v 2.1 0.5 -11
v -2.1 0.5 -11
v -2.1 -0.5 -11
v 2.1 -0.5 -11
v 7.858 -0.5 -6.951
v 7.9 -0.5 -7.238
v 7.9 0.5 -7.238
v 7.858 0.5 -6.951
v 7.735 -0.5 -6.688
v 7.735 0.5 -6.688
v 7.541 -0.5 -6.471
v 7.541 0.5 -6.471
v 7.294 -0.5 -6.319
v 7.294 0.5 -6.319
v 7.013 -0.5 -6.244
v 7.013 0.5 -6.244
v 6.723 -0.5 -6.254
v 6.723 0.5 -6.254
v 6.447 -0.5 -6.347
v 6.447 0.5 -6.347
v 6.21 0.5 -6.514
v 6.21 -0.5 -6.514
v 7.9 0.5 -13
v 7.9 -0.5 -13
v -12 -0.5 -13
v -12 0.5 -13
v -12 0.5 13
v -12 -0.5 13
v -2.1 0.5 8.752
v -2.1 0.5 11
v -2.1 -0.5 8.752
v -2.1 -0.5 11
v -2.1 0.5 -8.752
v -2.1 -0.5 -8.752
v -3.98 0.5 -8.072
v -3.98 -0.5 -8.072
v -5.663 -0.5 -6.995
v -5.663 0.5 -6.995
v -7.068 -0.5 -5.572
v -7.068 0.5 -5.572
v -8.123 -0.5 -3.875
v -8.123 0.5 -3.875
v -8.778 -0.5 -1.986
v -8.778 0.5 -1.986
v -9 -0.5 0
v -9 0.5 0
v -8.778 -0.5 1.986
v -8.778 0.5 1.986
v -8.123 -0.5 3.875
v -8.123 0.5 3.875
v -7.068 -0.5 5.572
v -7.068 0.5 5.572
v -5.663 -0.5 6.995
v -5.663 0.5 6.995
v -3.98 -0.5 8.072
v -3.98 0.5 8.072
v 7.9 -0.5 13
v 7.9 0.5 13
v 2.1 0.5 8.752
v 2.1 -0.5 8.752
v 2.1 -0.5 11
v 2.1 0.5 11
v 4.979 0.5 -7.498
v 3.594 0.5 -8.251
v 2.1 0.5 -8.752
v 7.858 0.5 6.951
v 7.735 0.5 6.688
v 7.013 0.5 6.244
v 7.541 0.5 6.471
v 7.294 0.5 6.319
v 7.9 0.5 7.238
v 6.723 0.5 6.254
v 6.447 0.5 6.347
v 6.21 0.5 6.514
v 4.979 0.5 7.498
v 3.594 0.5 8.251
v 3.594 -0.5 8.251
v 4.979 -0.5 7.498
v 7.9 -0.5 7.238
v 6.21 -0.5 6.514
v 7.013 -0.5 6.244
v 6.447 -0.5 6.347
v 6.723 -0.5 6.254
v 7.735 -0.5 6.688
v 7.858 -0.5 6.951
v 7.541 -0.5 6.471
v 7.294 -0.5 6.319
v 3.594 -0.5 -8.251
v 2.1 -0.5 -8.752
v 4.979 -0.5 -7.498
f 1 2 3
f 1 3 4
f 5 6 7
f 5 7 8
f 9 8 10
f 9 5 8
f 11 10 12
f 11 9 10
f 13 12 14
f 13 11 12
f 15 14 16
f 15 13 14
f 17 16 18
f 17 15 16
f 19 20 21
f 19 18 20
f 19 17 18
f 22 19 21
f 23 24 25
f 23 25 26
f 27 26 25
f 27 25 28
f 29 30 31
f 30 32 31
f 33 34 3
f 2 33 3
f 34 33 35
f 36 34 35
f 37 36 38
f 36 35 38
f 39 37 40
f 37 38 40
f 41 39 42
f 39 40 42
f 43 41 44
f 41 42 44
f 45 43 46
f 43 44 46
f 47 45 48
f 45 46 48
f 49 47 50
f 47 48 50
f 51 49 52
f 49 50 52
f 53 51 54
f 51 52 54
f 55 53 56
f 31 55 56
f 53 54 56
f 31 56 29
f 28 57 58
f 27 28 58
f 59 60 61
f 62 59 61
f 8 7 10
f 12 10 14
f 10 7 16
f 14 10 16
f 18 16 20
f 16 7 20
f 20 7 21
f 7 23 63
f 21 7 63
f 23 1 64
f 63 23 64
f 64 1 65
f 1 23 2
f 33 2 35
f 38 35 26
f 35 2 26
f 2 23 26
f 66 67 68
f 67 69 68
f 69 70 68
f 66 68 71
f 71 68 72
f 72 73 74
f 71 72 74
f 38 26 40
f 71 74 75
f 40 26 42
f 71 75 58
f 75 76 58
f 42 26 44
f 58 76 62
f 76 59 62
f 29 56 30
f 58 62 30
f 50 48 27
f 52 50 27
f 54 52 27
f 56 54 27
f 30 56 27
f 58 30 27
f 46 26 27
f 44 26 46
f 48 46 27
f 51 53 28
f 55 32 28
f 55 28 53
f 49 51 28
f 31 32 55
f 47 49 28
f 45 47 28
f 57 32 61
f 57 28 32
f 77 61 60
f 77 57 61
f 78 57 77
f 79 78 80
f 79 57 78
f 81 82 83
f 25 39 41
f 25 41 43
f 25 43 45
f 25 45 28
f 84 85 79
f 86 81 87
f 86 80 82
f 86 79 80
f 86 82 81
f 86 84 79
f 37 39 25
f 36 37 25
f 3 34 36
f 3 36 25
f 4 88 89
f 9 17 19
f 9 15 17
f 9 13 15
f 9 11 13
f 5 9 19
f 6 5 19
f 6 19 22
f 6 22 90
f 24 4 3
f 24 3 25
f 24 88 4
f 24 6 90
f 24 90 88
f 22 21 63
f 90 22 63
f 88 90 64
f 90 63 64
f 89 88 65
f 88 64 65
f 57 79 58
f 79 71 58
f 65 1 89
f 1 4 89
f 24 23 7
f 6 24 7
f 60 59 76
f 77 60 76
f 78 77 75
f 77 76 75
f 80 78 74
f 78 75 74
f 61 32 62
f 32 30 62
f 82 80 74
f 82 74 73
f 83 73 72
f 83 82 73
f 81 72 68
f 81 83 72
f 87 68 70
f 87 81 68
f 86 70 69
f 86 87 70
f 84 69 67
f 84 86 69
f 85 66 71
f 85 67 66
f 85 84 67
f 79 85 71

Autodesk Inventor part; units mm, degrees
ref_plane "YZ Plane" through (0, 0, 0) normal (1, 0, 0) x (0, 1, 0)
ref_plane "XZ Plane" through (0, 0, 0) normal (0, 1, 0) x (-1, 0, 0)
ref_plane "XY Plane" through (0, 0, 0) normal (0, 0, 1) x (1, 0, 0)
sketch "Esquisse1" plane through (0, 0, 0) normal (1, 0, 0) x (0, 1, 0)
  line L0 (0.5, 12) -> (-0.5, 12)
  line L1 (-0.5, 12) -> (-0.5, -12)
  line L2 (-0.5, -12) -> (0.5, -12)
  line L3 (0.5, -12) -> (0.5, 12)
  line L4 (0.5, 12) -> (-0.5, -12) construction
  line L5 (-0.5, 12) -> (0.5, -12) construction
  line L6 (0.5, -12) -> (-4.7, -12)
  line L7 (-4.7, -12) -> (-4.7, -13)
  line L8 (-4.7, -13) -> (0.5, -13)
  line L9 (0.5, -13) -> (0.5, -12)
  line L10 (0.5, 12) -> (-4.7, 12)
  line L11 (-4.7, 12) -> (-4.7, 13)
  line L12 (-4.7, 13) -> (0.5, 13)
  line L13 (0.5, 13) -> (0.5, 12)
  line L14 (-4.7, -13) -> (-3.7, -13)
  line L15 (-3.7, -13) -> (-3.7, -21)
  line L16 (-3.7, -21) -> (-4.7, -21)
  line L17 (-4.7, -21) -> (-4.7, -13)
  line L18 (-4.7, 13) -> (-3.7, 13)
  line L19 (-3.7, 13) -> (-3.7, 21)
  line L20 (-3.7, 21) -> (-4.7, 21)
  line L21 (-4.7, 21) -> (-4.7, 13)
  point P0 (0, 0)
  dimension "d0" = 24
  dimension "d1" = 1
  dimension "d2" = 8
  dimension "d3" = 4.2
extrude "Extrusion1" add sketch "Esquisse1" along normal mid plane 15.8
sketch "Esquisse2" plane through (-7.9, -0.5, -12) normal (0, -1, 0) x (1, 0, 0)
  circle A0 centre (7.9, 19.9) radius 2.1
  line L0 (7.9, 19.9) -> (7.9, 12) construction
  line L1 (7.9, 12) -> (7.9, 4.1) construction
  line L2 (10, 19.9) -> (10, 24)
  line L3 (0, 24) -> (15.8, 24) projected
  line L4 (5.8, 24) -> (5.8, 19.9)
  line L5 (10, 19.9) -> (5.8, 19.9) construction
  dimension "d6" = 15.8
  dimension "d7" = 4.2
extrude "Extrusion2" cut sketch "Esquisse2" against normal through all
sketch "Esquisse3" plane through (-7.9, -3.7, 21) normal (0, 1, 0) x (1, 0, 0)
  circle A0 centre (7.9, 4) radius 1.6
  line L0 (0, 0) -> (15.8, 0) construction
  line L1 (7.9, 0) -> (7.9, 4) construction
  line L2 (7.9, 4) -> (7.9, 8) construction
  line L3 (0, 8) -> (15.8, 8) construction
  point P0 (7.9, 21)
  dimension "d10" = 3.2
extrude "Extrusion3" cut sketch "Esquisse3" against normal through all
mirror "Symétrie2" about plane through (0, 0, 0) normal (0, 0, 1) of "Extrusion2", "Extrusion3"
sketch "Sketch4" plane through (7.9, 0, 0) normal (1, 0, 0) x (0, 0, -1)
  line L0 (13, 0.5) -> (-13, 0.5) projected
  line L1 (-13, 0.5) -> (-13, -3.7) projected
  line L2 (-13, -3.7) -> (-21, -3.7) projected
  line L3 (-21, -3.7) -> (-21, -4.7) projected
  line L4 (-21, -4.7) -> (-12, -4.7) projected
  line L5 (-12, -4.7) -> (-12, -0.5) projected
  line L6 (-12, -0.5) -> (12, -0.5) projected
  line L7 (12, -0.5) -> (12, -4.7) projected
  line L8 (12, -4.7) -> (21, -4.7) projected
  line L9 (21, -4.7) -> (21, -3.7) projected
  line L10 (21, -3.7) -> (13, -3.7) projected
  line L11 (13, -3.7) -> (13, 0.5) projected
  line L12 (-12, -0.5) -> (-13, -0.5)
  line L13 (12, -0.5) -> (13, -0.5)
  point P0 (0, 0)
extrude "Extrusion4" cut sketch "Sketch4" against normal through all contours L11 L10 L9 L8 L7 L13 | L12 L5 L4 L3 L2 L1
sketch "Sketch5" plane through (-7.9, 0.5, 13) normal (0, 1, 0) x (1, 0, 0)
  line L0 (-4.1, 0) -> (19.9, 0)
  line L1 (19.9, 0) -> (19.9, 26)
  line L2 (19.9, 26) -> (-4.1, 26)
  line L3 (-4.1, 26) -> (-4.1, 0)
  line L4 (-4.1, 0) -> (19.9, 26) construction
  line L5 (19.9, 0) -> (-4.1, 26) construction
  arc A0 (5.8, 20.9) -> (10, 20.9) centre (7.9, 20.9) ccw projected
  line L6 (5.8, 20.9) -> (5.8, 25) projected
  line L7 (5.8, 25) -> (10, 25) projected
  line L8 (10, 25) -> (10, 20.9) projected
  line L9 (10, 1) -> (5.8, 1) projected
  line L10 (5.8, 1) -> (5.8, 5.1) projected
  arc A1 (10, 5.1) -> (5.8, 5.1) centre (7.9, 5.1) ccw projected
  line L11 (10, 5.1) -> (10, 1) projected
  line L12 (0, 0) -> (15.8, 0) projected
  line L13 (15.8, 26) -> (15.8, 0) projected
  line L14 (15.8, 26) -> (0, 26) projected
  line L15 (0, 0) -> (0, 26) projected
  point P0 (7.9, 13)
  dimension "d16" = 24
  dimension "d22" = 26
extrude "Extrusion5" add sketch "Sketch5" against normal up to surface (1 mm away) contours L3 L2 L15 L0 | L13 L2 L1 L0
sketch "Sketch7" plane through (-12, 0.5, -13) normal (0, 1, 0) x (1, 0, 0)
  circle A0 centre (12, -13) radius 9
  dimension "d23" = 18
extrude "Extrusion7" cut sketch "Sketch7" against normal through all
sketch "Sketch8" plane through (12, 0.5, 13) normal (0, 1, 0) x (1, 0, 0)
  line L0 (-24, 0) -> (0, 0) projected
  line L1 (0, 0) -> (0, 26) projected
  line L2 (0, 26) -> (-24, 26) projected
  line L3 (-24, 26) -> (-24, 0) projected
  arc A0 (-9.9, 4.2484) -> (-9.9, 21.7516) centre (-12, 13) ccw projected
  line L4 (-9.9, 4.2484) -> (-9.9, 1) projected
  line L5 (-9.9, 1) -> (-14.1, 1) projected
  line L6 (-14.1, 1) -> (-14.1, 4.2484) projected
  arc A1 (-14.1, 21.7516) -> (-14.1, 4.2484) centre (-12, 13) ccw projected
  line L7 (-14.1, 21.7516) -> (-14.1, 25) projected
  line L8 (-14.1, 25) -> (-9.9, 25) projected
  line L9 (-9.9, 25) -> (-9.9, 21.7516) projected
  line L10 (-14.1, 2) -> (-9.9, 2)
  line L11 (-14.1, 24) -> (-9.9, 24)
  line L12 (-12, 2) -> (-12, 1) construction
  line L13 (-12, 24) -> (-12, 25) construction
  point P0 (-14.1, 24)
  dimension "d27" = 1
extrude "Extrusion9" add sketch "Sketch8" against normal up to surface (1 mm away) contours L4 L5 L6 L10 | L11 L7 L8 L9
sketch "Sketch9" plane through (12, 0.5, 13) normal (0, 1, 0) x (1, 0, 0)
  line L0 (-24, 0) -> (0, 0) projected
  line L1 (0, 0) -> (0, 26) projected
  line L2 (0, 26) -> (-24, 26) projected
  line L3 (-24, 26) -> (-24, 0) projected
  arc A0 (-9.9, 4.2484) -> (-9.9, 21.7516) centre (-12, 13) ccw projected
  line L4 (-9.9, 4.2484) -> (-9.9, 2) projected
  line L5 (-9.9, 2) -> (-14.1, 2) projected
  line L6 (-14.1, 2) -> (-14.1, 4.2484) projected
  arc A1 (-14.1, 21.7516) -> (-14.1, 4.2484) centre (-12, 13) ccw projected
  line L7 (-14.1, 21.7516) -> (-14.1, 24) projected
  line L8 (-14.1, 24) -> (-9.9, 24) projected
  line L9 (-9.9, 24) -> (-9.9, 21.7516) projected
  line L10 (0, 26) -> (-4.1, 26)
  line L11 (-4.1, 26) -> (-4.1, 0)
  line L12 (-4.1, 0) -> (0, 0)
  line L13 (0, 0) -> (0, 26)
  point P0 (-4.1, 8.6884)
  point P1 (-4.1, 17.3116)
  dimension "d32" = 4.1
extrude "Extrusion10" cut sketch "Sketch9" against normal through all contours L11 A0 L2 L1 L0
fillet "Fillet3" radius 1 2 edges at (7.9, 0, 4.3116) (7.9, 0, -4.3116)
properties part number "Adapt_Roue_libre"
